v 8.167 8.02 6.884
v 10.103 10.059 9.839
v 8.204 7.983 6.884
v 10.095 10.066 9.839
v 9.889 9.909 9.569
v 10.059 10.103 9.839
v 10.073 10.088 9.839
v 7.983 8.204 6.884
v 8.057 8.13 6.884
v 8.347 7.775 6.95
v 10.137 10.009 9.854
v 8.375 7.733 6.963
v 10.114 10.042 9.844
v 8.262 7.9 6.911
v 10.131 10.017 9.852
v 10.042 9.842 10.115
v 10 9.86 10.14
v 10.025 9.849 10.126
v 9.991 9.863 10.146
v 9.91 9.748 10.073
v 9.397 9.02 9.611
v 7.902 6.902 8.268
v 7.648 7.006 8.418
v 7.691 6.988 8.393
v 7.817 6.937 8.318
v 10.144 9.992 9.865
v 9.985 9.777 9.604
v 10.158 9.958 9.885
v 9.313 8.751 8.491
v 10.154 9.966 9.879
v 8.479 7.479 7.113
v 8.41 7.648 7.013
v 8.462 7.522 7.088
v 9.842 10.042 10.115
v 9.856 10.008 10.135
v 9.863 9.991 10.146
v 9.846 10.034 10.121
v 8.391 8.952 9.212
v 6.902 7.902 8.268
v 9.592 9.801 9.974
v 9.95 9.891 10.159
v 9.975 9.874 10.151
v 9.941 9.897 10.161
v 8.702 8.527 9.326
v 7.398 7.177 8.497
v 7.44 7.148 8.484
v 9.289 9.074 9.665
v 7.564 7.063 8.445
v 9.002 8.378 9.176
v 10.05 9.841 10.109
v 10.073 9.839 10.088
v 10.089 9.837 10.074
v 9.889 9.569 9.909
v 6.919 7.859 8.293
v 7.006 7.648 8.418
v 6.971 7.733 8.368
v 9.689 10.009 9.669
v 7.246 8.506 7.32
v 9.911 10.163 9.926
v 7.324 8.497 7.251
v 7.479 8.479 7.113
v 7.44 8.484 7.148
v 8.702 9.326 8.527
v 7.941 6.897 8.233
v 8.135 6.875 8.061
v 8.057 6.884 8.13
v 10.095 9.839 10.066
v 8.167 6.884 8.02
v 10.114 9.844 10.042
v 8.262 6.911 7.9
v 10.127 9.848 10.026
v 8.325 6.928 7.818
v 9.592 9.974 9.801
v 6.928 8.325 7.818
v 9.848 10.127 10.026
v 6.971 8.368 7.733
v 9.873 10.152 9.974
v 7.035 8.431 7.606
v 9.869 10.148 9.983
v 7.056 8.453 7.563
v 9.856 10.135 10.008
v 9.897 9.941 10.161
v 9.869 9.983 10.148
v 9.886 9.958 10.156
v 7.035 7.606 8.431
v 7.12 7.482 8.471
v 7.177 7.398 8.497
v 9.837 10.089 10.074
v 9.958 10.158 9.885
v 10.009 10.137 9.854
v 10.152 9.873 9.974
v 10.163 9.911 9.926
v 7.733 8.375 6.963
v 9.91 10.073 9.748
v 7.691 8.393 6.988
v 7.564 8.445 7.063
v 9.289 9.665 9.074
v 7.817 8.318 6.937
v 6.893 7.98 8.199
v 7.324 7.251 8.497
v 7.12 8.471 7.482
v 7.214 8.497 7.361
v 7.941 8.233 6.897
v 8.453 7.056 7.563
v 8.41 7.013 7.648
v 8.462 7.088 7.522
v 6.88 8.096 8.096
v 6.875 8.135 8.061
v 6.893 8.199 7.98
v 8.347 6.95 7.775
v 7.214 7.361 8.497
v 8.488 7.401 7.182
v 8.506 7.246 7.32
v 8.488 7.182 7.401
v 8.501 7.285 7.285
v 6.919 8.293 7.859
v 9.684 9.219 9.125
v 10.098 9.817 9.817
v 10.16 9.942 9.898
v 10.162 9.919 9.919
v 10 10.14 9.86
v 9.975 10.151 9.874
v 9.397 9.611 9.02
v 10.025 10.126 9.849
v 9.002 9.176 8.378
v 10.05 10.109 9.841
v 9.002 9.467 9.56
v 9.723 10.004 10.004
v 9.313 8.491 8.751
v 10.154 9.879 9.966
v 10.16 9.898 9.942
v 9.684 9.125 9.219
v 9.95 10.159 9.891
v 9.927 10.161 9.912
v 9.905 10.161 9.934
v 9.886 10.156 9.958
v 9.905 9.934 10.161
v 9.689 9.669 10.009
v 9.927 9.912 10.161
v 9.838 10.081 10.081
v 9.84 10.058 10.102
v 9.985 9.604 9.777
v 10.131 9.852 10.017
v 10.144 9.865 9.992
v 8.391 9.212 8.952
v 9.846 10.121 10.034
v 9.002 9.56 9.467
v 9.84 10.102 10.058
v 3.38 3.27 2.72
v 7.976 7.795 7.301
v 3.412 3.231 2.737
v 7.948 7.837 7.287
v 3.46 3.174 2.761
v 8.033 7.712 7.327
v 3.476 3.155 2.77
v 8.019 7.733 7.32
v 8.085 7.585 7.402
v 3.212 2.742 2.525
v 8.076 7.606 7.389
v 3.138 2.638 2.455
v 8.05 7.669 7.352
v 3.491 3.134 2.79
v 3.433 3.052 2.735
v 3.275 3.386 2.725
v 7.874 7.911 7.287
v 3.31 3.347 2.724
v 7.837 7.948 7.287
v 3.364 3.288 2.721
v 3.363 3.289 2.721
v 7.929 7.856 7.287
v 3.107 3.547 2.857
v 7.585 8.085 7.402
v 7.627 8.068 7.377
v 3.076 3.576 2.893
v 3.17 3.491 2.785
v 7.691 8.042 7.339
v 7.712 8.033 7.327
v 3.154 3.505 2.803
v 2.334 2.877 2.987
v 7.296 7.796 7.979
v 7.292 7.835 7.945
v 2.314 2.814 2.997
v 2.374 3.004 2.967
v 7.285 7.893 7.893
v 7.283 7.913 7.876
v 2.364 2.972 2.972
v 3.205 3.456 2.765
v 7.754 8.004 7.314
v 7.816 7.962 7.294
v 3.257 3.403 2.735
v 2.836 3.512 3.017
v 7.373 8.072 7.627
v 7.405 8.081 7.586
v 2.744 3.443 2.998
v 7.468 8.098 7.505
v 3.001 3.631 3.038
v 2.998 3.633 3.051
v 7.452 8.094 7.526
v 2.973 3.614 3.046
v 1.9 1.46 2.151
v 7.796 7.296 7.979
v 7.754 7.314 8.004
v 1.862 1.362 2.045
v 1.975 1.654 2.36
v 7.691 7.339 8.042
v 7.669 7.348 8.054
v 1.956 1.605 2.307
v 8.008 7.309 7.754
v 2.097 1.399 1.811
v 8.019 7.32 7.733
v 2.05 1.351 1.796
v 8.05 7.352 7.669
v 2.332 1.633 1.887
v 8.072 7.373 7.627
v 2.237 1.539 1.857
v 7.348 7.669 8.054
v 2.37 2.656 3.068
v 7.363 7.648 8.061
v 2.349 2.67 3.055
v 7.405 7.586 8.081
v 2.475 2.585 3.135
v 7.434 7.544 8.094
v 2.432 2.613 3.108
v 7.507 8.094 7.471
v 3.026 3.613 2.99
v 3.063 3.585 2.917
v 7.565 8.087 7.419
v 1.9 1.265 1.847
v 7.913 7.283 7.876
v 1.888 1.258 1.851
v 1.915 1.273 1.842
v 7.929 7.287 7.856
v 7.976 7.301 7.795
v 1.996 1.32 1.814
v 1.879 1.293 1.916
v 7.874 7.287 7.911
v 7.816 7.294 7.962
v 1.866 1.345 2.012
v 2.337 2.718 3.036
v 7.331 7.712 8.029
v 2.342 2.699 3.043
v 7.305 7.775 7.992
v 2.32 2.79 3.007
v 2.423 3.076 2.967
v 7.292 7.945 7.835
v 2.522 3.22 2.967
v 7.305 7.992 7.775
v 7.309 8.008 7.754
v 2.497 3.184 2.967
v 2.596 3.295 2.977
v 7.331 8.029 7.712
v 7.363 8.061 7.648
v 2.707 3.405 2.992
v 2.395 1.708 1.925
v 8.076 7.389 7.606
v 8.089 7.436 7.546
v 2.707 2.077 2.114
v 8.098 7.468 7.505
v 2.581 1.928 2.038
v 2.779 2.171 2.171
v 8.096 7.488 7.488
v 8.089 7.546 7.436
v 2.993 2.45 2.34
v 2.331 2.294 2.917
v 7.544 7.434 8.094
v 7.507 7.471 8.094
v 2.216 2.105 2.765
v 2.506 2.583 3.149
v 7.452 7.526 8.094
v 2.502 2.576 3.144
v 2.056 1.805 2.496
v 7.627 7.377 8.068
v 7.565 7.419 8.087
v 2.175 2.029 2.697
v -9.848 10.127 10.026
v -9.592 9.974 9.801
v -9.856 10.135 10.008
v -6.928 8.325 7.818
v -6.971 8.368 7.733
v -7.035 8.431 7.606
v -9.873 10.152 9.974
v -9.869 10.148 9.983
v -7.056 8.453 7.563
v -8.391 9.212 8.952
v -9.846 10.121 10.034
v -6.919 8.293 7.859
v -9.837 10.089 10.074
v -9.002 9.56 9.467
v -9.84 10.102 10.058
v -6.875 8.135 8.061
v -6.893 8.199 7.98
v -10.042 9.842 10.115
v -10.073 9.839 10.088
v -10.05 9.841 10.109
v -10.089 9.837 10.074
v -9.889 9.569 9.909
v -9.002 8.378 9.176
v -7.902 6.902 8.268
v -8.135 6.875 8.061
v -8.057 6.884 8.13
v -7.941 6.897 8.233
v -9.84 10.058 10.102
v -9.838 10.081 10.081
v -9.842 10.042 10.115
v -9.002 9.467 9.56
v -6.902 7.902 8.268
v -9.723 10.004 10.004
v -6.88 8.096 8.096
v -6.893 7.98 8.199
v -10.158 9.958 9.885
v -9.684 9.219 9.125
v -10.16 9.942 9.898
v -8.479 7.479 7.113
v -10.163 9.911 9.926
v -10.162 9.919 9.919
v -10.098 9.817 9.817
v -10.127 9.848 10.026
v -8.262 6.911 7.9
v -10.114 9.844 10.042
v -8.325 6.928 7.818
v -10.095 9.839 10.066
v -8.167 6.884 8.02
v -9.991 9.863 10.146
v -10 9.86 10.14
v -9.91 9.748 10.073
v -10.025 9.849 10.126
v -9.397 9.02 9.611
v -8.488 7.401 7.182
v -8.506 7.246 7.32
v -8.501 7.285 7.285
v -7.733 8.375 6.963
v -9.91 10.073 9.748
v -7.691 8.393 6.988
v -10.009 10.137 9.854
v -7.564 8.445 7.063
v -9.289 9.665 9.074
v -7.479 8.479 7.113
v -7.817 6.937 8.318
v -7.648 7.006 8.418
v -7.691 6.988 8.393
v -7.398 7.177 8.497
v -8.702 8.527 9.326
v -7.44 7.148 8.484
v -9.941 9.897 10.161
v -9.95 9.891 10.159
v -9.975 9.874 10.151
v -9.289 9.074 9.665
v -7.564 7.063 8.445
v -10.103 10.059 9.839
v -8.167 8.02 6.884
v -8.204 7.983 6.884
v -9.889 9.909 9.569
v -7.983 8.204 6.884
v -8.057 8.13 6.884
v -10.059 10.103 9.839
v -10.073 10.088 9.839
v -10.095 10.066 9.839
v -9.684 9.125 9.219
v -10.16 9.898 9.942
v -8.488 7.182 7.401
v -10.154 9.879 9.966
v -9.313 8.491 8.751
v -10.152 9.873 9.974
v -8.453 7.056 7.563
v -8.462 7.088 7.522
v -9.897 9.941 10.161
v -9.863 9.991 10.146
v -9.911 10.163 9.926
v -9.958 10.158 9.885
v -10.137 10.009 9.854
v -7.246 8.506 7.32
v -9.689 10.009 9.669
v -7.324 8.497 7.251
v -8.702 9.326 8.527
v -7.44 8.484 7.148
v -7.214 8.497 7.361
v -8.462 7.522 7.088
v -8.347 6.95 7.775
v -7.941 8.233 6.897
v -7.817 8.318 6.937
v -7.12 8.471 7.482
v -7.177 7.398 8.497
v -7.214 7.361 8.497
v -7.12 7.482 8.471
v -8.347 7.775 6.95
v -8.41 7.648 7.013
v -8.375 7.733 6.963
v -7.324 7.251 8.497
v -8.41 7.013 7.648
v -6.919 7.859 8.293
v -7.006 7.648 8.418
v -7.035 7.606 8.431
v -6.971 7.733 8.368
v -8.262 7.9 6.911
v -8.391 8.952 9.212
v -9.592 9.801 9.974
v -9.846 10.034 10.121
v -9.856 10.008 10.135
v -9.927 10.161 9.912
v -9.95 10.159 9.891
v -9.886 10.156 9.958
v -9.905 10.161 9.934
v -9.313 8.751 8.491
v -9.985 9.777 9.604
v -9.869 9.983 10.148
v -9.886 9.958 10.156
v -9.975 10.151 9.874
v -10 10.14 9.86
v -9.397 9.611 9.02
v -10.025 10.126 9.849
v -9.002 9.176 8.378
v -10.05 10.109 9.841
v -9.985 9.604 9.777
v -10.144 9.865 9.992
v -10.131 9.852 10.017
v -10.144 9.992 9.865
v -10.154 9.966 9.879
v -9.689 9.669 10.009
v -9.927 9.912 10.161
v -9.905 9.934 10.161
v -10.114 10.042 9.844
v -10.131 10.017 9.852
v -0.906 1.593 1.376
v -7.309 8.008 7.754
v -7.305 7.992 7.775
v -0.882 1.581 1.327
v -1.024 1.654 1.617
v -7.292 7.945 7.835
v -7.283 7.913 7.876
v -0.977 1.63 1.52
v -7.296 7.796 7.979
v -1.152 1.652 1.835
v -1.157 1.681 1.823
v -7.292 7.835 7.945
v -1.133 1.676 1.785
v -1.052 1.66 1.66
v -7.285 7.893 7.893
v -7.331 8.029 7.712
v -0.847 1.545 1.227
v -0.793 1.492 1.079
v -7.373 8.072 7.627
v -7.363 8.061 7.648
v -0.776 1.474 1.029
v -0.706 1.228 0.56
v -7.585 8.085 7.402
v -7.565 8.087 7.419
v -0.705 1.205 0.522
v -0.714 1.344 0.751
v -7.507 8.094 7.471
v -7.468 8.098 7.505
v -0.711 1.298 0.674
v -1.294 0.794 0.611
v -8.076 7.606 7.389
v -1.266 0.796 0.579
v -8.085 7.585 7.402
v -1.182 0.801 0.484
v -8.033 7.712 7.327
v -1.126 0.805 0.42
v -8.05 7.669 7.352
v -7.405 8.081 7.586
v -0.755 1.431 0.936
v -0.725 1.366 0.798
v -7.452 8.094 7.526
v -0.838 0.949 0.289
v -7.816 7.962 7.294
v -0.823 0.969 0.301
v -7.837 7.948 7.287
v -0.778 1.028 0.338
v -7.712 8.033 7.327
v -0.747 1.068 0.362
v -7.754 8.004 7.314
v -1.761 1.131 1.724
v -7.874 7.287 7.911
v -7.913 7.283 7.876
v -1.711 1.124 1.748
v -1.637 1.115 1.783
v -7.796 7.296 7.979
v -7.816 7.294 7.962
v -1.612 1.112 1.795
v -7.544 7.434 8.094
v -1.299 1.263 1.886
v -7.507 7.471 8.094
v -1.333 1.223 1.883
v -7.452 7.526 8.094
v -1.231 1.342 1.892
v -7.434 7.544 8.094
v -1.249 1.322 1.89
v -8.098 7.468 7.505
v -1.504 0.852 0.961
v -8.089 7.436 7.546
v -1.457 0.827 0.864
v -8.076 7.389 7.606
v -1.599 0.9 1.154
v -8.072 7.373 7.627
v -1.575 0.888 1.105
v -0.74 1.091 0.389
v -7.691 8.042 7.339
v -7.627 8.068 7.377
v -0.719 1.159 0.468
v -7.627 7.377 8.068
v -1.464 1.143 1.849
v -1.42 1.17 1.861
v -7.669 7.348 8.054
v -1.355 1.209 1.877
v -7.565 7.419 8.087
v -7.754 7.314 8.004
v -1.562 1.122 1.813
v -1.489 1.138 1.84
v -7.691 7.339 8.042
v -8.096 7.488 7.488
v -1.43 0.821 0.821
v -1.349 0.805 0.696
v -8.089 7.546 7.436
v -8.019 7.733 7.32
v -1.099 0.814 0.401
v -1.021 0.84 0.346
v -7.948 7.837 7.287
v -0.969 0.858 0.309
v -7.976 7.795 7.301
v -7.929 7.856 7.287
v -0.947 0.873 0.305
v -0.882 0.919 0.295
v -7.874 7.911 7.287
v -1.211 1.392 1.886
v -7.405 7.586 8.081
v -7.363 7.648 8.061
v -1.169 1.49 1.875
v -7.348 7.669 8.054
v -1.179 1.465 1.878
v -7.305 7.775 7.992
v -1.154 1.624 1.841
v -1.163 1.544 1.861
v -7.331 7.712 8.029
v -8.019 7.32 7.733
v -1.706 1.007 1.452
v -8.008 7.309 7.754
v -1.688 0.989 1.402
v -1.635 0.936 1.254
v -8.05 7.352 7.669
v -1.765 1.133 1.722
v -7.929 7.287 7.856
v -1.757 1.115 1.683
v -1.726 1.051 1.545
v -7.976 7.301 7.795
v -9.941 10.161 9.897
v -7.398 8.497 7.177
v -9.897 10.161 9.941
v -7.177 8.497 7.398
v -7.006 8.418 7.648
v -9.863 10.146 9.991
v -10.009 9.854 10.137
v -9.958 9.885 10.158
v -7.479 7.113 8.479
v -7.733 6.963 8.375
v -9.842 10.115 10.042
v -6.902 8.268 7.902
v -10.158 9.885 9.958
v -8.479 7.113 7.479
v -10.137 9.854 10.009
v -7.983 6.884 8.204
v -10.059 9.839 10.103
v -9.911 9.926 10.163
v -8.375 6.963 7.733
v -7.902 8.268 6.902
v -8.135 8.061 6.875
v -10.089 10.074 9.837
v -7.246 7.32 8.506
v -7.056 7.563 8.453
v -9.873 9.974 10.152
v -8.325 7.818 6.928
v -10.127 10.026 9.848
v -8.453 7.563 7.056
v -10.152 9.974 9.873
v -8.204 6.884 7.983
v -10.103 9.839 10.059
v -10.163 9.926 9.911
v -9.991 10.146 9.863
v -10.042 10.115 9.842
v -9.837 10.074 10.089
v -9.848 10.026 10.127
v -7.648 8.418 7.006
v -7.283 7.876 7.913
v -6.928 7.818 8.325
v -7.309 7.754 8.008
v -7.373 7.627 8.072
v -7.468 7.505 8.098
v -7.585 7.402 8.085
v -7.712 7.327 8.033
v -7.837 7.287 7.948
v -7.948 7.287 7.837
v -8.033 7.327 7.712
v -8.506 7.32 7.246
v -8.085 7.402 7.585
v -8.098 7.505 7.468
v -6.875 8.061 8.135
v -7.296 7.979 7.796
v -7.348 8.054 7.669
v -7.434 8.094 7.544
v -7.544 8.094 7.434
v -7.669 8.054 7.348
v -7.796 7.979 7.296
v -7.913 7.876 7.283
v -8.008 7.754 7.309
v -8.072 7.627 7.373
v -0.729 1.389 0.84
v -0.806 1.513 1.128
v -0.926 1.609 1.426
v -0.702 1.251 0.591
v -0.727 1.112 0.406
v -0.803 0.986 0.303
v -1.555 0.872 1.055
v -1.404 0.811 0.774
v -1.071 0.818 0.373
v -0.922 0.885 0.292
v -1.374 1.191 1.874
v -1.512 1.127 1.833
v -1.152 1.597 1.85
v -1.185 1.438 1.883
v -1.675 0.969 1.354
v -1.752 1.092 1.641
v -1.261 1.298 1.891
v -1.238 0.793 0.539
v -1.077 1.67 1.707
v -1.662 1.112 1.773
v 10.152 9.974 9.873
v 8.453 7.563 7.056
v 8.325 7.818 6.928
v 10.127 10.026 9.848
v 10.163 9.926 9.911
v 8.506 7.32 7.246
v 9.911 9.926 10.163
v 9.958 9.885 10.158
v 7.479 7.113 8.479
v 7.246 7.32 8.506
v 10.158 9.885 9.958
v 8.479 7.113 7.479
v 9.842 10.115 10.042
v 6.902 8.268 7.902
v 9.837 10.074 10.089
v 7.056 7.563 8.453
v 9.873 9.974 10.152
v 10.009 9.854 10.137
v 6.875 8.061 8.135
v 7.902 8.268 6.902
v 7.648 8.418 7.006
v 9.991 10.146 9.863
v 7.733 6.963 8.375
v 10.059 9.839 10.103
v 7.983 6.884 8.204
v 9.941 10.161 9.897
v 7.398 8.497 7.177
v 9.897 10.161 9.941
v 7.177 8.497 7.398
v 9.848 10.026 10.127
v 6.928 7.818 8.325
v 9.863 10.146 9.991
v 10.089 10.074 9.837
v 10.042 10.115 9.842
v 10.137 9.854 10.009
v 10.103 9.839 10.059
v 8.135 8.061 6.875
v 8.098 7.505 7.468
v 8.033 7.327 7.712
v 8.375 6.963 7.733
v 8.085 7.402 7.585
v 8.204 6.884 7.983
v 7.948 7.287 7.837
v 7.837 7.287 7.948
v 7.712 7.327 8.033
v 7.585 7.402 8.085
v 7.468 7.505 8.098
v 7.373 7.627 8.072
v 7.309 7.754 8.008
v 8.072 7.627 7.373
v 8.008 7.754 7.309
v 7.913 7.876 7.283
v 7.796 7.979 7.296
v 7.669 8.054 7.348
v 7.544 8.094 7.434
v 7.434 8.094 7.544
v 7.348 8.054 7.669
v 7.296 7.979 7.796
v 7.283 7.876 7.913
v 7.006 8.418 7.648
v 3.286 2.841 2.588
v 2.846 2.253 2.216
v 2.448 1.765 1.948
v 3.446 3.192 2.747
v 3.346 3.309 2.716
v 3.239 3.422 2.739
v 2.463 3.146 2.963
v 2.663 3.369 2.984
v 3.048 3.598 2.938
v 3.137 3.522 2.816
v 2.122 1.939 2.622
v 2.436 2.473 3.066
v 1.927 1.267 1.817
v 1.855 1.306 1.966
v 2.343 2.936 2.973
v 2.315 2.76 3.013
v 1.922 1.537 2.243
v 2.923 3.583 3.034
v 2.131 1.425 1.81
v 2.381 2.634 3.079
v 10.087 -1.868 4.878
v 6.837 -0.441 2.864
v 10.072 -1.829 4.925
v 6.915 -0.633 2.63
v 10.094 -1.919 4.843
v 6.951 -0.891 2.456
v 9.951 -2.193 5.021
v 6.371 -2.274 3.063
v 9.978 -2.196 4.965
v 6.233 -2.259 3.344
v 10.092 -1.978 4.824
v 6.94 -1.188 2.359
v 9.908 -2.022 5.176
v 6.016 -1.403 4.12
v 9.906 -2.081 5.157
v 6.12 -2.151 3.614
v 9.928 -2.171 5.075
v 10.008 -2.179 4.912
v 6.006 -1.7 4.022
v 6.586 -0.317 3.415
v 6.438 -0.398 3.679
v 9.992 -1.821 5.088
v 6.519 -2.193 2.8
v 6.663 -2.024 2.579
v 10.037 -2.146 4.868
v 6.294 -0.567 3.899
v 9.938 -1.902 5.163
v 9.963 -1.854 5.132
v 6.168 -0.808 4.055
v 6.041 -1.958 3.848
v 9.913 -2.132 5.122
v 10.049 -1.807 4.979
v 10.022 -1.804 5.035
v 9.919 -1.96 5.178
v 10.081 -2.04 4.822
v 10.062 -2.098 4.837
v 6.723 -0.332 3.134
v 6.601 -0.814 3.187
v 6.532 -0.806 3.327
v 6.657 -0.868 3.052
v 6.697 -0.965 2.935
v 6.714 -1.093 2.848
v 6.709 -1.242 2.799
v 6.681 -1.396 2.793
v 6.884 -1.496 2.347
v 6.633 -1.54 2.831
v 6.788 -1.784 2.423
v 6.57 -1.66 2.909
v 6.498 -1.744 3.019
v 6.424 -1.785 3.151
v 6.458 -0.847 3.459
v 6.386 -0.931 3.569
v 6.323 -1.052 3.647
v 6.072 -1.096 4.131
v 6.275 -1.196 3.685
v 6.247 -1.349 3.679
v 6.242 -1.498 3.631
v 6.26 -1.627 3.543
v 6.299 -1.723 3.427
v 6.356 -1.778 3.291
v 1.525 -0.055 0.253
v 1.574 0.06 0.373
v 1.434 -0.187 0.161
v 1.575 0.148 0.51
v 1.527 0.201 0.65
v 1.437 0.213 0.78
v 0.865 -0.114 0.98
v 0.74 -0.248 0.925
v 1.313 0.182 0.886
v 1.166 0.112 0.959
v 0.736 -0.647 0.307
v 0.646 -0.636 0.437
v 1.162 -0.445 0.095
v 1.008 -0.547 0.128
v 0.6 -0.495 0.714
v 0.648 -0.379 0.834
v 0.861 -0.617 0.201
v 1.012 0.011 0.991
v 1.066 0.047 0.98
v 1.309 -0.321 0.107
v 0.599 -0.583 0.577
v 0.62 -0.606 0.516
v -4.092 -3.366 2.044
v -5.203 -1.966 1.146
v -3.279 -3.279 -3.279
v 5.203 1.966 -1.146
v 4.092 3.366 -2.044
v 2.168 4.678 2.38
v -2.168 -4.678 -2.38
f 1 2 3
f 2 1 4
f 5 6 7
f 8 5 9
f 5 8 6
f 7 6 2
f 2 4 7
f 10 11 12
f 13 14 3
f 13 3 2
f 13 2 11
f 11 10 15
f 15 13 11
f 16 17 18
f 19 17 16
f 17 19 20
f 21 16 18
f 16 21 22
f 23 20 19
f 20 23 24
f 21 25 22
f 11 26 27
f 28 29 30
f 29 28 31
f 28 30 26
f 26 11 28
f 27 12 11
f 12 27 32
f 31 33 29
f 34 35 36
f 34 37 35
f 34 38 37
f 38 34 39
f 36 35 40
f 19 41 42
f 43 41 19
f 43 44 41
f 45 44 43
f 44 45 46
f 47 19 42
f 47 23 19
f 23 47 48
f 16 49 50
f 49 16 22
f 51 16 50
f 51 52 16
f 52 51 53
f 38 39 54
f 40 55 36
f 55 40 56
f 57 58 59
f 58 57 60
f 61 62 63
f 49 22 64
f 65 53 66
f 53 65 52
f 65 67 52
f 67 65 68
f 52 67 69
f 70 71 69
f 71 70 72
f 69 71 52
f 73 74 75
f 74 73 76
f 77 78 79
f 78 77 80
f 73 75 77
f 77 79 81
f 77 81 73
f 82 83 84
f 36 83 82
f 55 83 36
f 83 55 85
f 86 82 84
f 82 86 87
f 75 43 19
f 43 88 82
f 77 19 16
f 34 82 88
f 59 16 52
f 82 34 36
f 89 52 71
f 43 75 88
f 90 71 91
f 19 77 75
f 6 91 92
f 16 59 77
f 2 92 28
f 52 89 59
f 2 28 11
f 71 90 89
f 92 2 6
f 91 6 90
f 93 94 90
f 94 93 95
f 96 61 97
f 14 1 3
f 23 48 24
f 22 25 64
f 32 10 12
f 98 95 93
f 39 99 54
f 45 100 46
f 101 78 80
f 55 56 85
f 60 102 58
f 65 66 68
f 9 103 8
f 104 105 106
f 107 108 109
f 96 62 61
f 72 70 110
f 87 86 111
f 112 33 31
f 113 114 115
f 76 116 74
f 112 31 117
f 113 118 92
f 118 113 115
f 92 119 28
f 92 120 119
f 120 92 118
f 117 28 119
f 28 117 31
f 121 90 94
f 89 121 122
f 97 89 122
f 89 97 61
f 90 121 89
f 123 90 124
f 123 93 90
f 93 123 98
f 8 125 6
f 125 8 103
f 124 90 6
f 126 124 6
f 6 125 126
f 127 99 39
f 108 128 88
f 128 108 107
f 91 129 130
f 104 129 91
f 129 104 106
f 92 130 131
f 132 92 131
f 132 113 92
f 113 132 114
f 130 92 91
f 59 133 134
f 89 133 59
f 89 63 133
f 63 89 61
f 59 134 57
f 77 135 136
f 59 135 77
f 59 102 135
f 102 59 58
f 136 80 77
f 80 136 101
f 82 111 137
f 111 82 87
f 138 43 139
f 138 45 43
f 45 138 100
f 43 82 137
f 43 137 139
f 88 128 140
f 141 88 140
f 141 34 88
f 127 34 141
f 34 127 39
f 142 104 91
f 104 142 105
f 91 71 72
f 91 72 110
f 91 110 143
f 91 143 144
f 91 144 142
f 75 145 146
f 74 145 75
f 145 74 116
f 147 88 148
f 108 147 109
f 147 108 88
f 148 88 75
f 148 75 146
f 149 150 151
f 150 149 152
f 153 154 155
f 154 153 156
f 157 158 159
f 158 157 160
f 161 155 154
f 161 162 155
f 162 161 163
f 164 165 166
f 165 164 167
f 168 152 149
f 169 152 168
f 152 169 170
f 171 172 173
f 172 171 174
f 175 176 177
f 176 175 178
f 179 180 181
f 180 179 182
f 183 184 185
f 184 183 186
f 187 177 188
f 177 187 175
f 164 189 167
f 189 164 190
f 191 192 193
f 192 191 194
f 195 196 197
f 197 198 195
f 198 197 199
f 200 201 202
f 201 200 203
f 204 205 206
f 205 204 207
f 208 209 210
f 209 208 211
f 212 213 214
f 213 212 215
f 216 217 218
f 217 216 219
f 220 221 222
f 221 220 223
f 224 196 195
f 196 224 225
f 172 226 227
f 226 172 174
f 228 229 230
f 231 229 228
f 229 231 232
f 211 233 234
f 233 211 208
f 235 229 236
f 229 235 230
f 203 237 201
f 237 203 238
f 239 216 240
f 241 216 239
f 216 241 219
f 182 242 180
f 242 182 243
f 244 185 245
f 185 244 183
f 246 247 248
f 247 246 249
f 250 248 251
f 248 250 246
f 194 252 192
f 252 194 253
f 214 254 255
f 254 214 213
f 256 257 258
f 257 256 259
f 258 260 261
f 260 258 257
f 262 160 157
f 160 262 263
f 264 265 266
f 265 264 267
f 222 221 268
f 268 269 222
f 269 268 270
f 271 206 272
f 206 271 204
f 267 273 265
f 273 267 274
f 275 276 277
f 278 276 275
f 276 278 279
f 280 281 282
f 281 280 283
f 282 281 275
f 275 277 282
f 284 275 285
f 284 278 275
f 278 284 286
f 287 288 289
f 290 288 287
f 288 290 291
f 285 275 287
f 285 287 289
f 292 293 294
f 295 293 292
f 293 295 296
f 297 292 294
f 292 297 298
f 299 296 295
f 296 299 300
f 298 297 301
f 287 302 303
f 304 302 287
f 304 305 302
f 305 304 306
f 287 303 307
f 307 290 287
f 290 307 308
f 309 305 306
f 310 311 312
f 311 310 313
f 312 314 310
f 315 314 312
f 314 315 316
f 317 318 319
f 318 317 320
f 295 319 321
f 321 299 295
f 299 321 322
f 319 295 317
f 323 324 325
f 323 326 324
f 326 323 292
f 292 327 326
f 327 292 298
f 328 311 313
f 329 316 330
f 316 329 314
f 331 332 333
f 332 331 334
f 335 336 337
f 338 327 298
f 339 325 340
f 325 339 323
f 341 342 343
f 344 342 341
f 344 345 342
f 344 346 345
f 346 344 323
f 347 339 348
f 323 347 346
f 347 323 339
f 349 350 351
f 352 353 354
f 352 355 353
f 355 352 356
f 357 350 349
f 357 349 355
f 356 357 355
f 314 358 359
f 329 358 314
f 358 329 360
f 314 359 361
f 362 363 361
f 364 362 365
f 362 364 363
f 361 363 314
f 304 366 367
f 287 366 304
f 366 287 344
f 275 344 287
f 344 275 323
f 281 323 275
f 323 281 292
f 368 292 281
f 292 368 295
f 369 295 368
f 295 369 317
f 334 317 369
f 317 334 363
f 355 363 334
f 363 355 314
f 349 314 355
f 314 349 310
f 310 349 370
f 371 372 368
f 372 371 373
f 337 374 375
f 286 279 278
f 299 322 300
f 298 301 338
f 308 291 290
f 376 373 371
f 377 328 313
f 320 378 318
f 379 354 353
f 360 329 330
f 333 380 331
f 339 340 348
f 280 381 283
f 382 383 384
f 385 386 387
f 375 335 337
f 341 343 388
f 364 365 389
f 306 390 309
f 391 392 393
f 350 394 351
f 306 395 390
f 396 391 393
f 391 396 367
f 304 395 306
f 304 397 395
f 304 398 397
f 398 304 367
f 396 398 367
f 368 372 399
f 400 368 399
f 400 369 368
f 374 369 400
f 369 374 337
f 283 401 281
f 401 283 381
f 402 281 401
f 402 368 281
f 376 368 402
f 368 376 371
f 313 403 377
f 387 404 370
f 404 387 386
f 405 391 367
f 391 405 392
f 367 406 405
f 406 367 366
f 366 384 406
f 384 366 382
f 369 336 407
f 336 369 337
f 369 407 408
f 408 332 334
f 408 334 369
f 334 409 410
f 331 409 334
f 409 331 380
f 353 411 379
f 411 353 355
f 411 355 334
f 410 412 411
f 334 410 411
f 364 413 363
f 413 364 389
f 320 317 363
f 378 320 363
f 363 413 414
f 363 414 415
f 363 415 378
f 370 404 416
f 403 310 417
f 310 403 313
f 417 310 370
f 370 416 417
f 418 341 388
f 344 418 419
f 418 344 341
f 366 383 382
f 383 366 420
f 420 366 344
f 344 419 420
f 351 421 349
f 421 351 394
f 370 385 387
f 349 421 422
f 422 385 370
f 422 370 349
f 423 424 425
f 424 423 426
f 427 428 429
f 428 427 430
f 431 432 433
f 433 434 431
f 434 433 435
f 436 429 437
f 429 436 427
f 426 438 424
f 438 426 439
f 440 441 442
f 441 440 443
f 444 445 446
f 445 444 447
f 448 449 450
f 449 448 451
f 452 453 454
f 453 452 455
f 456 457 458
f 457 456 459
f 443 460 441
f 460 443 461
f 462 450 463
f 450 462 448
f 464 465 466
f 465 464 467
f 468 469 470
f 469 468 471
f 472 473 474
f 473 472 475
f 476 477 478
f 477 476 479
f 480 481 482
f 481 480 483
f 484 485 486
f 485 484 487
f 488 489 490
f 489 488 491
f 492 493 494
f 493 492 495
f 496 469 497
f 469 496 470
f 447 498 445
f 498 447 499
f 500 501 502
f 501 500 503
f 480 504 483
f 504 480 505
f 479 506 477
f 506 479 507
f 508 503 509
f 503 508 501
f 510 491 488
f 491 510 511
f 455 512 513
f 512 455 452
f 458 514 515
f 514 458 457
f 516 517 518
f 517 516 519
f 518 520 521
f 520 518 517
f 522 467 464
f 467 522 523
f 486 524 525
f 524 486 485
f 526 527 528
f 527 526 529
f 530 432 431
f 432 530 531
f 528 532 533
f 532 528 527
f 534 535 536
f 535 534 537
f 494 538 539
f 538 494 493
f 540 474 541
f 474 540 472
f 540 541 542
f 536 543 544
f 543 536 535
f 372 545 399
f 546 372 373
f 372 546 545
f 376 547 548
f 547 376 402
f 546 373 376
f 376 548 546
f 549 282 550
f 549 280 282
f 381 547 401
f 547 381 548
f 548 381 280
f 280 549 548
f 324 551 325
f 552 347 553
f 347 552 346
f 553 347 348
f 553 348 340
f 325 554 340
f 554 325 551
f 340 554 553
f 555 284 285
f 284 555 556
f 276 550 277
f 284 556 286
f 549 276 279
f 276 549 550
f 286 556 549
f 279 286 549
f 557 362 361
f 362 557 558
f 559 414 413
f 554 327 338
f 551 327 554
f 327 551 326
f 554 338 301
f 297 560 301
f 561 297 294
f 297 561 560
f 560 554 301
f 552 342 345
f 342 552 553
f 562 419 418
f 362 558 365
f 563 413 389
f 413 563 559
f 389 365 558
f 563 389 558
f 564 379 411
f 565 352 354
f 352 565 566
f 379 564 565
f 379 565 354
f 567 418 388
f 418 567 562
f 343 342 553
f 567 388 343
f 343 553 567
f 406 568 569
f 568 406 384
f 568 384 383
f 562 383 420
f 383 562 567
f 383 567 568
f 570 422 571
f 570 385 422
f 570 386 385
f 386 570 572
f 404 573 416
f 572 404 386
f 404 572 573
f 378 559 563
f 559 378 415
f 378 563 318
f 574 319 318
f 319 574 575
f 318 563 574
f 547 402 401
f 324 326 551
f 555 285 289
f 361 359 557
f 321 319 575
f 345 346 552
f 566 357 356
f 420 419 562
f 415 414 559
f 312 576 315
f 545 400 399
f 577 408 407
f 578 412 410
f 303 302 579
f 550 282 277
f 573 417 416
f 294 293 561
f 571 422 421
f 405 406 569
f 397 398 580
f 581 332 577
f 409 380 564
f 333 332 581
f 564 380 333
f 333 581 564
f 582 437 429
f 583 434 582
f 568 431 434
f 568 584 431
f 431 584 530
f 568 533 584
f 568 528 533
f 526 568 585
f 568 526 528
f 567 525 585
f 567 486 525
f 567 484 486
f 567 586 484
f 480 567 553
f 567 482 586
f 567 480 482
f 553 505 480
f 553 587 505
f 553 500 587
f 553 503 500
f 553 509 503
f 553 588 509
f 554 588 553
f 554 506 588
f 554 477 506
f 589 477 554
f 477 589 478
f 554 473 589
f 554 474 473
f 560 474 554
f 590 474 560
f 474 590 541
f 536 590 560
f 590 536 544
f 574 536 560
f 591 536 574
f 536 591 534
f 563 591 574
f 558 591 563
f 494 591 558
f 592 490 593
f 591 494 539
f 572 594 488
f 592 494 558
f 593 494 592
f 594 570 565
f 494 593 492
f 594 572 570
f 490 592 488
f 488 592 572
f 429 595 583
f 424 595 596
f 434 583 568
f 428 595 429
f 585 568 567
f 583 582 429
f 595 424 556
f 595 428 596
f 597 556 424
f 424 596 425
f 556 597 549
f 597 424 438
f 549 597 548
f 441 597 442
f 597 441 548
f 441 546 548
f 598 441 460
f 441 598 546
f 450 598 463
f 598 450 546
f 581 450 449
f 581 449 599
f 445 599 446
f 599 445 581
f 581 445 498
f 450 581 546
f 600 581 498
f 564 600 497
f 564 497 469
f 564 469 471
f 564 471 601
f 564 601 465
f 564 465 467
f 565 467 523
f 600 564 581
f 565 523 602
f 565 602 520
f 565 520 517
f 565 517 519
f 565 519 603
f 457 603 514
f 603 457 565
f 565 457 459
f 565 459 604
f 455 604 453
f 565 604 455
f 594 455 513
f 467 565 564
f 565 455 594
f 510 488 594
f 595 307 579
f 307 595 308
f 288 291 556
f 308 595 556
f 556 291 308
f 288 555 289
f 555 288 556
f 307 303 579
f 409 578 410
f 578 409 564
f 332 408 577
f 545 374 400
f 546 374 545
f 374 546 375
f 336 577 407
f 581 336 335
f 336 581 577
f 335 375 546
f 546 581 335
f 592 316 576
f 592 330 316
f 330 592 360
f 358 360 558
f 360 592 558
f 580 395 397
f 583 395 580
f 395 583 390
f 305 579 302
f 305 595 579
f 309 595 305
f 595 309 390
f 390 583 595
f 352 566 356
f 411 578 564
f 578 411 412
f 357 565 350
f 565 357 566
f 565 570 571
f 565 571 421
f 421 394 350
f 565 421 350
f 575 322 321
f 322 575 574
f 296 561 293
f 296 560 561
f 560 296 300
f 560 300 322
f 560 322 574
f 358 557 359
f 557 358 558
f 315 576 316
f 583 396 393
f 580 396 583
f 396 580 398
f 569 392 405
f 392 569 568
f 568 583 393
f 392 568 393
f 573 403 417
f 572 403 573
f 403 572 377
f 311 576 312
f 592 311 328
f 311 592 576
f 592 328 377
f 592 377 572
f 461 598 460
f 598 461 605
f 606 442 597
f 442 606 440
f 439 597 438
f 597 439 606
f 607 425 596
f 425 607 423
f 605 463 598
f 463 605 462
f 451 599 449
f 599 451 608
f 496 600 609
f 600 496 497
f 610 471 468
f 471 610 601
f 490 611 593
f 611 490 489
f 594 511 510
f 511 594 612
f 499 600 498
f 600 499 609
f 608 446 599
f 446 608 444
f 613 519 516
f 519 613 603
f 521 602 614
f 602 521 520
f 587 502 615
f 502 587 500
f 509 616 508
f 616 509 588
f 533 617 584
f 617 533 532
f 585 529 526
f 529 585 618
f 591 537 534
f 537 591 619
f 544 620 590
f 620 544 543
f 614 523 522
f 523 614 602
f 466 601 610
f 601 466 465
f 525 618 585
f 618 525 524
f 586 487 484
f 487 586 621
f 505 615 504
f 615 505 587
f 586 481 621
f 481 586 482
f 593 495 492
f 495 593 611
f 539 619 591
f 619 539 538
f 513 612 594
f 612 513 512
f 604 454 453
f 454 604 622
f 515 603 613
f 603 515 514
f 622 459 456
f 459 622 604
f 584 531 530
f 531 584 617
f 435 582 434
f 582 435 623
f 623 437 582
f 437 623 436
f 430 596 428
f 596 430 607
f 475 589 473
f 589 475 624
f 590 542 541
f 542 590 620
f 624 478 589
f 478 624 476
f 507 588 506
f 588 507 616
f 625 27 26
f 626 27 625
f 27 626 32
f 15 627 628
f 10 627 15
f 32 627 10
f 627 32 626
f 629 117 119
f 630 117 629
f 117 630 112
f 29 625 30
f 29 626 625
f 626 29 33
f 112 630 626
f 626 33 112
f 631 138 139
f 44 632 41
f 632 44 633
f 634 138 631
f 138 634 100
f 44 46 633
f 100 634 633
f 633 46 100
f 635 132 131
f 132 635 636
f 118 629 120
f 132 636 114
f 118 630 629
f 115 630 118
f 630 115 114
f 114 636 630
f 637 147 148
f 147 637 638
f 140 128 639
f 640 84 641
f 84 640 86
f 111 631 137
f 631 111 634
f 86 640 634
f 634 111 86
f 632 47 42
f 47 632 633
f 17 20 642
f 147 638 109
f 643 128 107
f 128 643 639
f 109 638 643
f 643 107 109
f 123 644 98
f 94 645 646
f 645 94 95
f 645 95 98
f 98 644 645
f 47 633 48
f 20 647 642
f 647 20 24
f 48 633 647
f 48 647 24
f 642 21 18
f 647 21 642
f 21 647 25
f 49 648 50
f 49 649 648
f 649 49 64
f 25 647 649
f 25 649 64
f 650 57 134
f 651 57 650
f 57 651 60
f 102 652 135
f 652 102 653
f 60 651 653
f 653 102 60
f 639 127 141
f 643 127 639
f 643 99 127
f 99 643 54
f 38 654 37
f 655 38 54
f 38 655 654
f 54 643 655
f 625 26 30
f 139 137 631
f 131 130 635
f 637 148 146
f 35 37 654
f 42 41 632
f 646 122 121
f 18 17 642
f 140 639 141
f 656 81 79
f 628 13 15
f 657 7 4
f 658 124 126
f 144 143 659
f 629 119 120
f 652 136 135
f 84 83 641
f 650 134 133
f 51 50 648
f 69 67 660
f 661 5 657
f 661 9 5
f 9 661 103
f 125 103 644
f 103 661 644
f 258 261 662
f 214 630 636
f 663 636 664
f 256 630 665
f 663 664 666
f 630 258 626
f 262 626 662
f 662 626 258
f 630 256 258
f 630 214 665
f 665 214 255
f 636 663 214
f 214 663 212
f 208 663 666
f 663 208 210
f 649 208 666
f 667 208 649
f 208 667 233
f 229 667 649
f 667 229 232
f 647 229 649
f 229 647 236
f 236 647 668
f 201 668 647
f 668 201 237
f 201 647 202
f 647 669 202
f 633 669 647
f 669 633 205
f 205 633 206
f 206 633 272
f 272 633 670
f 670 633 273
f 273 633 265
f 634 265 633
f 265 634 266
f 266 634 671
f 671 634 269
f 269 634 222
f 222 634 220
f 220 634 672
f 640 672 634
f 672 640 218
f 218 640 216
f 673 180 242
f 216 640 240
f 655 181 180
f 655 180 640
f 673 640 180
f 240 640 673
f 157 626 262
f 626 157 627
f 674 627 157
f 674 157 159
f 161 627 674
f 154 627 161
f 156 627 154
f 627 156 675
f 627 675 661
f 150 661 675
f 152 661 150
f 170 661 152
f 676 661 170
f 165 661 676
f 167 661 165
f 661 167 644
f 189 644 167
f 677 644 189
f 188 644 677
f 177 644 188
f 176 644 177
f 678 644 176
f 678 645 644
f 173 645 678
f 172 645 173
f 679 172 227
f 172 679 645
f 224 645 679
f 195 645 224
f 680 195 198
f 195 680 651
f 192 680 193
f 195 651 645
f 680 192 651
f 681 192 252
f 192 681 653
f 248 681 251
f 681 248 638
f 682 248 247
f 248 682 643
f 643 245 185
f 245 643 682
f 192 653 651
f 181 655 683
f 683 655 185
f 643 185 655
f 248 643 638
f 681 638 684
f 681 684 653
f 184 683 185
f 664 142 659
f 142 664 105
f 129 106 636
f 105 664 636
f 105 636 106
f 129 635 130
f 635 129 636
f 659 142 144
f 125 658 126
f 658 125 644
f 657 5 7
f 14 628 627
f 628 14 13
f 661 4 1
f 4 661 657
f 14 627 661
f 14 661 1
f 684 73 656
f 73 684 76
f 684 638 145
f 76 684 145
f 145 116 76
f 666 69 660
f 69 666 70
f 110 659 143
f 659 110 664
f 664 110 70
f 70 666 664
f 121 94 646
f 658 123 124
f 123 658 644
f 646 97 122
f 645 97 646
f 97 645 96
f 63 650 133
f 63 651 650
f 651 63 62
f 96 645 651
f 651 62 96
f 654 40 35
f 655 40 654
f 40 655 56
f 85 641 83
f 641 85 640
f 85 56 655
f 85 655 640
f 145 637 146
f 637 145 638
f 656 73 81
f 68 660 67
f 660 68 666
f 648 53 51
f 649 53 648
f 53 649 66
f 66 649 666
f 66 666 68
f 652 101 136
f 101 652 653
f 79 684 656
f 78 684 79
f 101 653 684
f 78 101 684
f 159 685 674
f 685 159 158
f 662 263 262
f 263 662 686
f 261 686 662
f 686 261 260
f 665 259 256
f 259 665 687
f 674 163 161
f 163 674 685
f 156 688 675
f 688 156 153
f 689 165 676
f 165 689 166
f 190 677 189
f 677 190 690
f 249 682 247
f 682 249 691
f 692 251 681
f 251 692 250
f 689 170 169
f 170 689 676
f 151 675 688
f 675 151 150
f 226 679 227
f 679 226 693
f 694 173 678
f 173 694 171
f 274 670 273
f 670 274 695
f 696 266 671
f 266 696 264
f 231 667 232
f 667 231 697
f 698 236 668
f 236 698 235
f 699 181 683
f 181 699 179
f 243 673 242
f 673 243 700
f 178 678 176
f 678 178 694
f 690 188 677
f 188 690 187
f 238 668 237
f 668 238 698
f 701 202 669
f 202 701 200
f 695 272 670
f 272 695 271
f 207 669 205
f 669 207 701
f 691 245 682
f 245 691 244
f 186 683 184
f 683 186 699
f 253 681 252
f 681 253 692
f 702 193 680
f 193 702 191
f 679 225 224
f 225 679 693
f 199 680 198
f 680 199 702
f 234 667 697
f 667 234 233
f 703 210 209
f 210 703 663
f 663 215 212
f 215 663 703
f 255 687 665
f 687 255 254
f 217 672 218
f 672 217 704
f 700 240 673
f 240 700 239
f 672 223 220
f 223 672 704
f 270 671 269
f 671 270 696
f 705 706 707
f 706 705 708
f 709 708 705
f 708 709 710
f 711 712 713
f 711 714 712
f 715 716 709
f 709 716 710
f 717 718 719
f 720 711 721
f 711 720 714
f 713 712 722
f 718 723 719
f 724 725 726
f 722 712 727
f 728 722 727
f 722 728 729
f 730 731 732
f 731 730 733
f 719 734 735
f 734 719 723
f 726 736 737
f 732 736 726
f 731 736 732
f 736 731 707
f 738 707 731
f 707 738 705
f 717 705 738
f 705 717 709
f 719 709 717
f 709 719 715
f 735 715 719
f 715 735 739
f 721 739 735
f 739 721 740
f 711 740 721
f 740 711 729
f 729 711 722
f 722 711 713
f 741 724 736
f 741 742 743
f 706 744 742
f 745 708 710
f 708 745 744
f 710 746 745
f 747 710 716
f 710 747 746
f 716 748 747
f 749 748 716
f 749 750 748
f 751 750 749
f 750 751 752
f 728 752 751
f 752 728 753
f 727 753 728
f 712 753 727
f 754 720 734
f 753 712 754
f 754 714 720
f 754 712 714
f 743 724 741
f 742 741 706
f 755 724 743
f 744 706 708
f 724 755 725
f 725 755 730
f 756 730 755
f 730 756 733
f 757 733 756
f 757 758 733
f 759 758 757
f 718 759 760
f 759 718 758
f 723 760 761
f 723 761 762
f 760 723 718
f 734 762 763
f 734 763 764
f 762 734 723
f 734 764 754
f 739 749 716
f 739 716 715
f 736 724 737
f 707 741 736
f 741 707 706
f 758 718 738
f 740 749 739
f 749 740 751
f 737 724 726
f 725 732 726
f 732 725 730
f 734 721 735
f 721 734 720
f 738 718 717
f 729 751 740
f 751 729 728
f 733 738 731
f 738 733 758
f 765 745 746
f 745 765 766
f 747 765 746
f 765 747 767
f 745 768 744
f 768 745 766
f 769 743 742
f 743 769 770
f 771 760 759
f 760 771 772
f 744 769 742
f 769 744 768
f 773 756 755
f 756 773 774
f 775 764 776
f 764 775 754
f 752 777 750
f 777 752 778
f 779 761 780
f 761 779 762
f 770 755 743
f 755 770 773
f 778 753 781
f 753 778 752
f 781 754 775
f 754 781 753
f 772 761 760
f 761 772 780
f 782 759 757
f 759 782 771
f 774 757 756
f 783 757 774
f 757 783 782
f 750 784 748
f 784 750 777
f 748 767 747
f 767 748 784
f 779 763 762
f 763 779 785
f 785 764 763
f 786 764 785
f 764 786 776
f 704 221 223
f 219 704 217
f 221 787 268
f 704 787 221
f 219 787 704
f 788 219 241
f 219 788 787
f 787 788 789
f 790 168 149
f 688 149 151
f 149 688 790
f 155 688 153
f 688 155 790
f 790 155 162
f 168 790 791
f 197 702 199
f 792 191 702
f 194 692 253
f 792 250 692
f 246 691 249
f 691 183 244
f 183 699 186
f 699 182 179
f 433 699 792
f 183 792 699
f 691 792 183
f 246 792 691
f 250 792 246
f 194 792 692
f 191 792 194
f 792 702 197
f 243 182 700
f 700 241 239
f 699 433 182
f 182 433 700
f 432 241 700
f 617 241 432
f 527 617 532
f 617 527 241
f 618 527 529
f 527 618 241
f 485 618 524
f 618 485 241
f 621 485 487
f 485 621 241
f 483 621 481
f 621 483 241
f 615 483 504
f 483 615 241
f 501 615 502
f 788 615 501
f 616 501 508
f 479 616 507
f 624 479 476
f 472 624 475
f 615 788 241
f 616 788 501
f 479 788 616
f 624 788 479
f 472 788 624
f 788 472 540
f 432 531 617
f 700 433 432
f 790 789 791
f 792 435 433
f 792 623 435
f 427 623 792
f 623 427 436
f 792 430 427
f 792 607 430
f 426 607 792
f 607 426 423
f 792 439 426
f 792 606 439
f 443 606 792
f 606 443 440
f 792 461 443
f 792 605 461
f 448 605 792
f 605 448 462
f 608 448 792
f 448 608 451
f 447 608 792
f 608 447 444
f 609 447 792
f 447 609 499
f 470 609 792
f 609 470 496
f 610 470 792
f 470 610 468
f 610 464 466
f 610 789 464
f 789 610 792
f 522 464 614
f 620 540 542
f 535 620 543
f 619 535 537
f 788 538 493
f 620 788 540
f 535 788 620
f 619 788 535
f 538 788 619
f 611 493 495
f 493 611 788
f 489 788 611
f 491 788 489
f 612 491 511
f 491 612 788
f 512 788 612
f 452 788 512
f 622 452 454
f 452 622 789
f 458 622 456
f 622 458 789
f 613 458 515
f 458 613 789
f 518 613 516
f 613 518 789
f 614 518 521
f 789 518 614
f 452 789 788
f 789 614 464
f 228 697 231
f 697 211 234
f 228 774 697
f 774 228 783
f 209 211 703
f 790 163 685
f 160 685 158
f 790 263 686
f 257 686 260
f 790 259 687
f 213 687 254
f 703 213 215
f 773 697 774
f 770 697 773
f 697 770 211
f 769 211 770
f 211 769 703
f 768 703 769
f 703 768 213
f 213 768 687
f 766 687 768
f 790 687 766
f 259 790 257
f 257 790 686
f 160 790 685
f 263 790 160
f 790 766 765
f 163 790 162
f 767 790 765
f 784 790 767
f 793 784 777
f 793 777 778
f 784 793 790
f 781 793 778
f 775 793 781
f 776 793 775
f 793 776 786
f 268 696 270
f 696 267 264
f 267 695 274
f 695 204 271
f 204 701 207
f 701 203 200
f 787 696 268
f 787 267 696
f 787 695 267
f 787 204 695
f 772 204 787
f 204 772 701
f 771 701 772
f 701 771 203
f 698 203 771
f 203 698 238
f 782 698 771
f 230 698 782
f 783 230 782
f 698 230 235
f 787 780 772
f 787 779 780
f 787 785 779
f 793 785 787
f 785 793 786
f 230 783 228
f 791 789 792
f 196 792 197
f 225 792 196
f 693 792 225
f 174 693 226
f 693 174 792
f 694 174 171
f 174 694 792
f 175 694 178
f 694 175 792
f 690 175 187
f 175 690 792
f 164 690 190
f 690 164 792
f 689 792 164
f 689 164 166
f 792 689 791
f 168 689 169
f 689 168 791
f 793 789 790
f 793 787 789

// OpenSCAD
//---------------------------------------------------------------
//-- Openscad vector library
//-- This is a component of the obiscad opescad tools by Obijuan
//-- (C) Juan Gonzalez-Gomez (Obijuan)
//-- Sep-2012
//---------------------------------------------------------------
//-- Released under the GPL license
//---------------------------------------------------------------

//----------------------------------------
//-- FUNCTIONS FOR WORKING WITH VECTORS
//----------------------------------------

//-- Calculate the module of a vector
function mod(v) = (sqrt(v[0]*v[0]+v[1]*v[1]+v[2]*v[2]));

//-- Calculate the cros product of two vectors
function cross(u,v) = [
  u[1]*v[2] - v[1]*u[2],
  -(u[0]*v[2] - v[0]*u[2]) ,
  u[0]*v[1] - v[0]*u[1]];

//-- Calculate the dot product of two vectors
function dot(u,v) = u[0]*v[0]+u[1]*v[1]+u[2]*v[2];

//-- Return the unit vector of a vector
function unitv(v) = v/mod(v);

//-- Return the angle between two vectors
function anglev(u,v) = acos( dot(u,v) / (mod(u)*mod(v)) );

//-- Return a vector that is perpendicular
function perpendicular(vec) = vec.x == 0 ? [1,0,0] : vec.y == 0 ? [0,1,0] : vec.z == 0 ? [0,0,1] : [-vec.y,vec.x,0];;

//----------------------------------------------------------
//--  Draw a point in the position given by the vector p  
//----------------------------------------------------------
module point(p)
{
  translate(p)
    sphere(r=0.7,$fn=20);
}

//------------------------------------------------------------------
//-- Draw a vector poiting to the z axis
//-- This is an auxiliary module for implementing the vector module
//--
//-- Parameters:
//--  l: total vector length (line + arrow)
//--  l_arrow: Vector arrow length
//--  mark: If true, a mark is draw in the vector head, for having
//--    a visual reference of the rolling angle
//------------------------------------------------------------------
module vectorz(l=10, l_arrow=4, mark=false)
{
  //-- vector body length (not including the arrow)
  lb = l - l_arrow;

  //-- The vector is locatead at 0,0,0
  translate([0,0,lb/2])
  union() {

    //-- Draw the arrow
    translate([0,0,lb/2])
      cylinder(r1=2/2, r2=0.2, h=l_arrow, $fn=20);

    //-- Draw the mark
    if (mark) {
      translate([0,0,lb/2+l_arrow/2])
      translate([1,0,0])
        cube([2,0.3,l_arrow*0.8],center=true);
    }

    //-- Draw the body
    cylinder(r=1/2, h=lb, center=true, $fn=20);
  }

  //-- Draw a sphere in the vector base
  sphere(r=1/2, $fn=20);
}

//-----------------------------------------------------------------
//-- ORIENTATE OPERATOR
//--
//--  Orientate an object to the direction given by the vector v
//--  Parameters:
//--    v : Target orientation
//--    vref: Vector reference. It is the vector of the local frame
//--          of the object that want to be poiting in the direction
//--          of v
//--    roll: Rotation of the object around the v axis
//-------------------------------------------------------------------
module orientate(v,vref=[0,0,1], roll=0)
{
  //-- Calculate the rotation axis
  raxis = cross(vref,v);
  
  //-- Calculate the angle between the vectors
  ang = anglev(vref,v);

  //-- Rotate the child!
  rotate(a=roll, v=v)
    rotate(a=ang, v=raxis)
      child(0);
}

//---------------------------------------------------------------------------
//-- Draw a vector 
//--
//-- There are two modes of drawing the vector
//-- * Mode 1: Given by a cartesian point(x,y,z). A vector from the origin
//--           to the end (x,y,z) is drawn. The l parameter (length) must 
//--           be 0  (l=0)
//-- * Mode 2: Give by direction and length
//--           A vector of length l pointing to the direction given by
//--           v is drawn
//---------------------------------------------------------------------------
//-- Parameters:
//--  v: Vector cartesian coordinates
//--  l: total vector length (line + arrow)
//--  l_arrow: Vector arrow length
//    mark: If true, a mark is draw in the vector head, for having
//--    a visual reference of the rolling angle
//---------------------------------------------------------------------------
module vector(v,l=0, l_arrow=4, mark=false)
{
  //-- Get the vector length from the coordinates
  mod = mod(v);

  //-- The vector is very easy implemented by means of the orientate
  //-- operator:
  //--  orientate(v) vectorz(l=mod, l_arrow=l_arrow)
  //--  BUT... in OPENSCAD 2012.02.22 the recursion does not
  //--    not work, so that if the user use the orientate operator
  //--    on a vector, openscad will ignore it..
  //-- The solution at the moment (I hope the openscad developers
  //--  implement the recursion in the near future...)
  //--  is to repite the orientate operation in this module

  //---- SAME CALCULATIONS THAN THE ORIENTATE OPERATOR!
  //-- Calculate the rotation axis

  vref = [0,0,1];
  raxis = cross(vref,v);
  
  //-- Calculate the angle between the vectors
  ang = anglev(vref,v);

  //-- orientate the vector
  //-- Draw the vector. The vector length is given either
  //--- by the mod variable (when l=0) or by l (when l!=0)
  if (l==0)
    rotate(a=ang, v=raxis)
      vectorz(l=mod, l_arrow=l_arrow, mark=mark);
  else
    rotate(a=ang, v=raxis)
      vectorz(l=l, l_arrow=l_arrow, mark=mark);

}

//----------------------------------------------------
//-- Draw a Frame of reference
//-- Parameters:
//-- l: length of the Unit vectors
//-----------------------------------------------------
module frame(l=10, l_arrow=4)
{

  //-- Z unit vector
  color("Blue")
    vector([0,0,l], l_arrow=l_arrow);

  //-- X unit vector
  color("Red")
    vector([l,0,0], l_arrow=l_arrow );

  //-- Y unit vector
  color("Green")
    vector([0,l,0],l_arrow=l_arrow);

  //-- Origin
  color("Gray")
    sphere(r=1, $fn=20);
}

//--------------------------------------------------
//-- Modules for testings and examples
//-- Testing that the vector library is working ok
//--------------------------------------------------

//-- 22 vectors in total are drawn, poiting to different directions
module Test_vectors1()
{

  a = 20;
  k = 1;

  //--  Add a frame of reference (in the origin)
  frame(l=a);

  //-- Negative vectors, pointing towards the three axis: -x, -y, -z
  color("Red")   vector([-a, 0,  0]);
  color("Green") vector([0, -a,  0]);
  color("Blue")  vector([0,  0, -a]);

  //-- It is *not* has been implemented using a for loop on purpose
  //-- This way, individual vectors can be commented out or highlighted

  //-- vectors with positive z
  vector([a,   a, a*k]);
  vector([0,   a, a*k]);
  vector([-a,  a, a*k]);
  vector([-a,  0, a*k]);

  vector([-a, -a, a*k]);
  vector([0,  -a, a*k]);
  vector([a,  -a, a*k]);
  vector([a,   0, a*k]);


  //-- Vectors with negative z
  vector([a,   a, -a*k]);
  vector([0,   a, -a*k]);
  vector([-a,  a, -a*k]);
  vector([-a,  0, -a*k]);

  vector([-a, -a, -a*k]);
  vector([0,  -a, -a*k]);
  vector([a,  -a, -a*k]);
  vector([a,   0, -a*k]);
}

//--- Another test...
module Test_vectors2()
{

  //-- Add the vector into the vector table
  //-- This vectors are taken as directions
  //-- All the vectors will be drawn with the same length (l)
  vector_table = [
    [1,   1, 1],
    [0,   1, 1],
    [-1,  1, 1],
    [-1,  0, 1],
    [-1, -1, 1],
    [0,  -1, 1],
    [1,  -1, 1],
    [1,   0, 1],
  
    [1,   1, -1],
    [0,   1, -1],
    [-1,  1, -1],
    [-1,  0, -1],
    [-1, -1, -1],
    [0,  -1, -1],
    [1,  -1, -1],
    [1,   0, -1],
  ];

  //-- Vector length
  l=20;

  frame(l=10);

  //-- Draw all the vector given in the table
  //-- The vectors point to the direction given in the table
  //-- They all are drawn with a length equal to l
  for (v=vector_table) {
    //-- Vector given by direction and length
    vector(v,l=l);
  }
}


//-- Test the cross product and the angle
//-- between vectors
module Test_vector3()
{
  //-- Start with 2 unit vectors
  v=unitv([1,1,1]);
  u=unitv([0,1,0]);

  //-- Draw the vector in different colors
  //-- Increase the length for drawing
  color("Red") vector(v*20);
  color("blue") vector(u*20);

  //-- Get the cross product
  w = cross(v,u);
  vector(w*20);

  //-- The cross product is NOT conmutative... 
  //-- change the order of v and u
  w2 = cross(u,v);
  vector(w2*20);

  //-- w should be perpendicular to v and u
  //-- Calculate the angles between them:
  echo("U , V: ", anglev(u,v));
  echo("W , U: ", anglev(w,u));
  echo("W , V: ", anglev(w,v));

}

//-- Test the orientate operator
module Test_vector4()
{
  o = [10,10,10];
  v = [-10,10,10];

  color("Red") vector(o);
  color("Blue") vector(v);

  //-- Orientate the vector o in the direction of v
  orientate(v,o)
    vector(o);

  //-- Inverse operation: orientate the v vector in the direction
  //-- of o
  orientate(o,v)
    vector(v);

  //-- Example of orientation of a cube
  orientate(o,vref=[10,-2,5],roll=0)
    cube([10,2,5],center=true);

  vector([10,-2,5]);

}

//-------- Perform tests......

Test_vector4();


/*

Test_vectors1();


translate([60,0,0]) 
  Test_vectors2();
*/
